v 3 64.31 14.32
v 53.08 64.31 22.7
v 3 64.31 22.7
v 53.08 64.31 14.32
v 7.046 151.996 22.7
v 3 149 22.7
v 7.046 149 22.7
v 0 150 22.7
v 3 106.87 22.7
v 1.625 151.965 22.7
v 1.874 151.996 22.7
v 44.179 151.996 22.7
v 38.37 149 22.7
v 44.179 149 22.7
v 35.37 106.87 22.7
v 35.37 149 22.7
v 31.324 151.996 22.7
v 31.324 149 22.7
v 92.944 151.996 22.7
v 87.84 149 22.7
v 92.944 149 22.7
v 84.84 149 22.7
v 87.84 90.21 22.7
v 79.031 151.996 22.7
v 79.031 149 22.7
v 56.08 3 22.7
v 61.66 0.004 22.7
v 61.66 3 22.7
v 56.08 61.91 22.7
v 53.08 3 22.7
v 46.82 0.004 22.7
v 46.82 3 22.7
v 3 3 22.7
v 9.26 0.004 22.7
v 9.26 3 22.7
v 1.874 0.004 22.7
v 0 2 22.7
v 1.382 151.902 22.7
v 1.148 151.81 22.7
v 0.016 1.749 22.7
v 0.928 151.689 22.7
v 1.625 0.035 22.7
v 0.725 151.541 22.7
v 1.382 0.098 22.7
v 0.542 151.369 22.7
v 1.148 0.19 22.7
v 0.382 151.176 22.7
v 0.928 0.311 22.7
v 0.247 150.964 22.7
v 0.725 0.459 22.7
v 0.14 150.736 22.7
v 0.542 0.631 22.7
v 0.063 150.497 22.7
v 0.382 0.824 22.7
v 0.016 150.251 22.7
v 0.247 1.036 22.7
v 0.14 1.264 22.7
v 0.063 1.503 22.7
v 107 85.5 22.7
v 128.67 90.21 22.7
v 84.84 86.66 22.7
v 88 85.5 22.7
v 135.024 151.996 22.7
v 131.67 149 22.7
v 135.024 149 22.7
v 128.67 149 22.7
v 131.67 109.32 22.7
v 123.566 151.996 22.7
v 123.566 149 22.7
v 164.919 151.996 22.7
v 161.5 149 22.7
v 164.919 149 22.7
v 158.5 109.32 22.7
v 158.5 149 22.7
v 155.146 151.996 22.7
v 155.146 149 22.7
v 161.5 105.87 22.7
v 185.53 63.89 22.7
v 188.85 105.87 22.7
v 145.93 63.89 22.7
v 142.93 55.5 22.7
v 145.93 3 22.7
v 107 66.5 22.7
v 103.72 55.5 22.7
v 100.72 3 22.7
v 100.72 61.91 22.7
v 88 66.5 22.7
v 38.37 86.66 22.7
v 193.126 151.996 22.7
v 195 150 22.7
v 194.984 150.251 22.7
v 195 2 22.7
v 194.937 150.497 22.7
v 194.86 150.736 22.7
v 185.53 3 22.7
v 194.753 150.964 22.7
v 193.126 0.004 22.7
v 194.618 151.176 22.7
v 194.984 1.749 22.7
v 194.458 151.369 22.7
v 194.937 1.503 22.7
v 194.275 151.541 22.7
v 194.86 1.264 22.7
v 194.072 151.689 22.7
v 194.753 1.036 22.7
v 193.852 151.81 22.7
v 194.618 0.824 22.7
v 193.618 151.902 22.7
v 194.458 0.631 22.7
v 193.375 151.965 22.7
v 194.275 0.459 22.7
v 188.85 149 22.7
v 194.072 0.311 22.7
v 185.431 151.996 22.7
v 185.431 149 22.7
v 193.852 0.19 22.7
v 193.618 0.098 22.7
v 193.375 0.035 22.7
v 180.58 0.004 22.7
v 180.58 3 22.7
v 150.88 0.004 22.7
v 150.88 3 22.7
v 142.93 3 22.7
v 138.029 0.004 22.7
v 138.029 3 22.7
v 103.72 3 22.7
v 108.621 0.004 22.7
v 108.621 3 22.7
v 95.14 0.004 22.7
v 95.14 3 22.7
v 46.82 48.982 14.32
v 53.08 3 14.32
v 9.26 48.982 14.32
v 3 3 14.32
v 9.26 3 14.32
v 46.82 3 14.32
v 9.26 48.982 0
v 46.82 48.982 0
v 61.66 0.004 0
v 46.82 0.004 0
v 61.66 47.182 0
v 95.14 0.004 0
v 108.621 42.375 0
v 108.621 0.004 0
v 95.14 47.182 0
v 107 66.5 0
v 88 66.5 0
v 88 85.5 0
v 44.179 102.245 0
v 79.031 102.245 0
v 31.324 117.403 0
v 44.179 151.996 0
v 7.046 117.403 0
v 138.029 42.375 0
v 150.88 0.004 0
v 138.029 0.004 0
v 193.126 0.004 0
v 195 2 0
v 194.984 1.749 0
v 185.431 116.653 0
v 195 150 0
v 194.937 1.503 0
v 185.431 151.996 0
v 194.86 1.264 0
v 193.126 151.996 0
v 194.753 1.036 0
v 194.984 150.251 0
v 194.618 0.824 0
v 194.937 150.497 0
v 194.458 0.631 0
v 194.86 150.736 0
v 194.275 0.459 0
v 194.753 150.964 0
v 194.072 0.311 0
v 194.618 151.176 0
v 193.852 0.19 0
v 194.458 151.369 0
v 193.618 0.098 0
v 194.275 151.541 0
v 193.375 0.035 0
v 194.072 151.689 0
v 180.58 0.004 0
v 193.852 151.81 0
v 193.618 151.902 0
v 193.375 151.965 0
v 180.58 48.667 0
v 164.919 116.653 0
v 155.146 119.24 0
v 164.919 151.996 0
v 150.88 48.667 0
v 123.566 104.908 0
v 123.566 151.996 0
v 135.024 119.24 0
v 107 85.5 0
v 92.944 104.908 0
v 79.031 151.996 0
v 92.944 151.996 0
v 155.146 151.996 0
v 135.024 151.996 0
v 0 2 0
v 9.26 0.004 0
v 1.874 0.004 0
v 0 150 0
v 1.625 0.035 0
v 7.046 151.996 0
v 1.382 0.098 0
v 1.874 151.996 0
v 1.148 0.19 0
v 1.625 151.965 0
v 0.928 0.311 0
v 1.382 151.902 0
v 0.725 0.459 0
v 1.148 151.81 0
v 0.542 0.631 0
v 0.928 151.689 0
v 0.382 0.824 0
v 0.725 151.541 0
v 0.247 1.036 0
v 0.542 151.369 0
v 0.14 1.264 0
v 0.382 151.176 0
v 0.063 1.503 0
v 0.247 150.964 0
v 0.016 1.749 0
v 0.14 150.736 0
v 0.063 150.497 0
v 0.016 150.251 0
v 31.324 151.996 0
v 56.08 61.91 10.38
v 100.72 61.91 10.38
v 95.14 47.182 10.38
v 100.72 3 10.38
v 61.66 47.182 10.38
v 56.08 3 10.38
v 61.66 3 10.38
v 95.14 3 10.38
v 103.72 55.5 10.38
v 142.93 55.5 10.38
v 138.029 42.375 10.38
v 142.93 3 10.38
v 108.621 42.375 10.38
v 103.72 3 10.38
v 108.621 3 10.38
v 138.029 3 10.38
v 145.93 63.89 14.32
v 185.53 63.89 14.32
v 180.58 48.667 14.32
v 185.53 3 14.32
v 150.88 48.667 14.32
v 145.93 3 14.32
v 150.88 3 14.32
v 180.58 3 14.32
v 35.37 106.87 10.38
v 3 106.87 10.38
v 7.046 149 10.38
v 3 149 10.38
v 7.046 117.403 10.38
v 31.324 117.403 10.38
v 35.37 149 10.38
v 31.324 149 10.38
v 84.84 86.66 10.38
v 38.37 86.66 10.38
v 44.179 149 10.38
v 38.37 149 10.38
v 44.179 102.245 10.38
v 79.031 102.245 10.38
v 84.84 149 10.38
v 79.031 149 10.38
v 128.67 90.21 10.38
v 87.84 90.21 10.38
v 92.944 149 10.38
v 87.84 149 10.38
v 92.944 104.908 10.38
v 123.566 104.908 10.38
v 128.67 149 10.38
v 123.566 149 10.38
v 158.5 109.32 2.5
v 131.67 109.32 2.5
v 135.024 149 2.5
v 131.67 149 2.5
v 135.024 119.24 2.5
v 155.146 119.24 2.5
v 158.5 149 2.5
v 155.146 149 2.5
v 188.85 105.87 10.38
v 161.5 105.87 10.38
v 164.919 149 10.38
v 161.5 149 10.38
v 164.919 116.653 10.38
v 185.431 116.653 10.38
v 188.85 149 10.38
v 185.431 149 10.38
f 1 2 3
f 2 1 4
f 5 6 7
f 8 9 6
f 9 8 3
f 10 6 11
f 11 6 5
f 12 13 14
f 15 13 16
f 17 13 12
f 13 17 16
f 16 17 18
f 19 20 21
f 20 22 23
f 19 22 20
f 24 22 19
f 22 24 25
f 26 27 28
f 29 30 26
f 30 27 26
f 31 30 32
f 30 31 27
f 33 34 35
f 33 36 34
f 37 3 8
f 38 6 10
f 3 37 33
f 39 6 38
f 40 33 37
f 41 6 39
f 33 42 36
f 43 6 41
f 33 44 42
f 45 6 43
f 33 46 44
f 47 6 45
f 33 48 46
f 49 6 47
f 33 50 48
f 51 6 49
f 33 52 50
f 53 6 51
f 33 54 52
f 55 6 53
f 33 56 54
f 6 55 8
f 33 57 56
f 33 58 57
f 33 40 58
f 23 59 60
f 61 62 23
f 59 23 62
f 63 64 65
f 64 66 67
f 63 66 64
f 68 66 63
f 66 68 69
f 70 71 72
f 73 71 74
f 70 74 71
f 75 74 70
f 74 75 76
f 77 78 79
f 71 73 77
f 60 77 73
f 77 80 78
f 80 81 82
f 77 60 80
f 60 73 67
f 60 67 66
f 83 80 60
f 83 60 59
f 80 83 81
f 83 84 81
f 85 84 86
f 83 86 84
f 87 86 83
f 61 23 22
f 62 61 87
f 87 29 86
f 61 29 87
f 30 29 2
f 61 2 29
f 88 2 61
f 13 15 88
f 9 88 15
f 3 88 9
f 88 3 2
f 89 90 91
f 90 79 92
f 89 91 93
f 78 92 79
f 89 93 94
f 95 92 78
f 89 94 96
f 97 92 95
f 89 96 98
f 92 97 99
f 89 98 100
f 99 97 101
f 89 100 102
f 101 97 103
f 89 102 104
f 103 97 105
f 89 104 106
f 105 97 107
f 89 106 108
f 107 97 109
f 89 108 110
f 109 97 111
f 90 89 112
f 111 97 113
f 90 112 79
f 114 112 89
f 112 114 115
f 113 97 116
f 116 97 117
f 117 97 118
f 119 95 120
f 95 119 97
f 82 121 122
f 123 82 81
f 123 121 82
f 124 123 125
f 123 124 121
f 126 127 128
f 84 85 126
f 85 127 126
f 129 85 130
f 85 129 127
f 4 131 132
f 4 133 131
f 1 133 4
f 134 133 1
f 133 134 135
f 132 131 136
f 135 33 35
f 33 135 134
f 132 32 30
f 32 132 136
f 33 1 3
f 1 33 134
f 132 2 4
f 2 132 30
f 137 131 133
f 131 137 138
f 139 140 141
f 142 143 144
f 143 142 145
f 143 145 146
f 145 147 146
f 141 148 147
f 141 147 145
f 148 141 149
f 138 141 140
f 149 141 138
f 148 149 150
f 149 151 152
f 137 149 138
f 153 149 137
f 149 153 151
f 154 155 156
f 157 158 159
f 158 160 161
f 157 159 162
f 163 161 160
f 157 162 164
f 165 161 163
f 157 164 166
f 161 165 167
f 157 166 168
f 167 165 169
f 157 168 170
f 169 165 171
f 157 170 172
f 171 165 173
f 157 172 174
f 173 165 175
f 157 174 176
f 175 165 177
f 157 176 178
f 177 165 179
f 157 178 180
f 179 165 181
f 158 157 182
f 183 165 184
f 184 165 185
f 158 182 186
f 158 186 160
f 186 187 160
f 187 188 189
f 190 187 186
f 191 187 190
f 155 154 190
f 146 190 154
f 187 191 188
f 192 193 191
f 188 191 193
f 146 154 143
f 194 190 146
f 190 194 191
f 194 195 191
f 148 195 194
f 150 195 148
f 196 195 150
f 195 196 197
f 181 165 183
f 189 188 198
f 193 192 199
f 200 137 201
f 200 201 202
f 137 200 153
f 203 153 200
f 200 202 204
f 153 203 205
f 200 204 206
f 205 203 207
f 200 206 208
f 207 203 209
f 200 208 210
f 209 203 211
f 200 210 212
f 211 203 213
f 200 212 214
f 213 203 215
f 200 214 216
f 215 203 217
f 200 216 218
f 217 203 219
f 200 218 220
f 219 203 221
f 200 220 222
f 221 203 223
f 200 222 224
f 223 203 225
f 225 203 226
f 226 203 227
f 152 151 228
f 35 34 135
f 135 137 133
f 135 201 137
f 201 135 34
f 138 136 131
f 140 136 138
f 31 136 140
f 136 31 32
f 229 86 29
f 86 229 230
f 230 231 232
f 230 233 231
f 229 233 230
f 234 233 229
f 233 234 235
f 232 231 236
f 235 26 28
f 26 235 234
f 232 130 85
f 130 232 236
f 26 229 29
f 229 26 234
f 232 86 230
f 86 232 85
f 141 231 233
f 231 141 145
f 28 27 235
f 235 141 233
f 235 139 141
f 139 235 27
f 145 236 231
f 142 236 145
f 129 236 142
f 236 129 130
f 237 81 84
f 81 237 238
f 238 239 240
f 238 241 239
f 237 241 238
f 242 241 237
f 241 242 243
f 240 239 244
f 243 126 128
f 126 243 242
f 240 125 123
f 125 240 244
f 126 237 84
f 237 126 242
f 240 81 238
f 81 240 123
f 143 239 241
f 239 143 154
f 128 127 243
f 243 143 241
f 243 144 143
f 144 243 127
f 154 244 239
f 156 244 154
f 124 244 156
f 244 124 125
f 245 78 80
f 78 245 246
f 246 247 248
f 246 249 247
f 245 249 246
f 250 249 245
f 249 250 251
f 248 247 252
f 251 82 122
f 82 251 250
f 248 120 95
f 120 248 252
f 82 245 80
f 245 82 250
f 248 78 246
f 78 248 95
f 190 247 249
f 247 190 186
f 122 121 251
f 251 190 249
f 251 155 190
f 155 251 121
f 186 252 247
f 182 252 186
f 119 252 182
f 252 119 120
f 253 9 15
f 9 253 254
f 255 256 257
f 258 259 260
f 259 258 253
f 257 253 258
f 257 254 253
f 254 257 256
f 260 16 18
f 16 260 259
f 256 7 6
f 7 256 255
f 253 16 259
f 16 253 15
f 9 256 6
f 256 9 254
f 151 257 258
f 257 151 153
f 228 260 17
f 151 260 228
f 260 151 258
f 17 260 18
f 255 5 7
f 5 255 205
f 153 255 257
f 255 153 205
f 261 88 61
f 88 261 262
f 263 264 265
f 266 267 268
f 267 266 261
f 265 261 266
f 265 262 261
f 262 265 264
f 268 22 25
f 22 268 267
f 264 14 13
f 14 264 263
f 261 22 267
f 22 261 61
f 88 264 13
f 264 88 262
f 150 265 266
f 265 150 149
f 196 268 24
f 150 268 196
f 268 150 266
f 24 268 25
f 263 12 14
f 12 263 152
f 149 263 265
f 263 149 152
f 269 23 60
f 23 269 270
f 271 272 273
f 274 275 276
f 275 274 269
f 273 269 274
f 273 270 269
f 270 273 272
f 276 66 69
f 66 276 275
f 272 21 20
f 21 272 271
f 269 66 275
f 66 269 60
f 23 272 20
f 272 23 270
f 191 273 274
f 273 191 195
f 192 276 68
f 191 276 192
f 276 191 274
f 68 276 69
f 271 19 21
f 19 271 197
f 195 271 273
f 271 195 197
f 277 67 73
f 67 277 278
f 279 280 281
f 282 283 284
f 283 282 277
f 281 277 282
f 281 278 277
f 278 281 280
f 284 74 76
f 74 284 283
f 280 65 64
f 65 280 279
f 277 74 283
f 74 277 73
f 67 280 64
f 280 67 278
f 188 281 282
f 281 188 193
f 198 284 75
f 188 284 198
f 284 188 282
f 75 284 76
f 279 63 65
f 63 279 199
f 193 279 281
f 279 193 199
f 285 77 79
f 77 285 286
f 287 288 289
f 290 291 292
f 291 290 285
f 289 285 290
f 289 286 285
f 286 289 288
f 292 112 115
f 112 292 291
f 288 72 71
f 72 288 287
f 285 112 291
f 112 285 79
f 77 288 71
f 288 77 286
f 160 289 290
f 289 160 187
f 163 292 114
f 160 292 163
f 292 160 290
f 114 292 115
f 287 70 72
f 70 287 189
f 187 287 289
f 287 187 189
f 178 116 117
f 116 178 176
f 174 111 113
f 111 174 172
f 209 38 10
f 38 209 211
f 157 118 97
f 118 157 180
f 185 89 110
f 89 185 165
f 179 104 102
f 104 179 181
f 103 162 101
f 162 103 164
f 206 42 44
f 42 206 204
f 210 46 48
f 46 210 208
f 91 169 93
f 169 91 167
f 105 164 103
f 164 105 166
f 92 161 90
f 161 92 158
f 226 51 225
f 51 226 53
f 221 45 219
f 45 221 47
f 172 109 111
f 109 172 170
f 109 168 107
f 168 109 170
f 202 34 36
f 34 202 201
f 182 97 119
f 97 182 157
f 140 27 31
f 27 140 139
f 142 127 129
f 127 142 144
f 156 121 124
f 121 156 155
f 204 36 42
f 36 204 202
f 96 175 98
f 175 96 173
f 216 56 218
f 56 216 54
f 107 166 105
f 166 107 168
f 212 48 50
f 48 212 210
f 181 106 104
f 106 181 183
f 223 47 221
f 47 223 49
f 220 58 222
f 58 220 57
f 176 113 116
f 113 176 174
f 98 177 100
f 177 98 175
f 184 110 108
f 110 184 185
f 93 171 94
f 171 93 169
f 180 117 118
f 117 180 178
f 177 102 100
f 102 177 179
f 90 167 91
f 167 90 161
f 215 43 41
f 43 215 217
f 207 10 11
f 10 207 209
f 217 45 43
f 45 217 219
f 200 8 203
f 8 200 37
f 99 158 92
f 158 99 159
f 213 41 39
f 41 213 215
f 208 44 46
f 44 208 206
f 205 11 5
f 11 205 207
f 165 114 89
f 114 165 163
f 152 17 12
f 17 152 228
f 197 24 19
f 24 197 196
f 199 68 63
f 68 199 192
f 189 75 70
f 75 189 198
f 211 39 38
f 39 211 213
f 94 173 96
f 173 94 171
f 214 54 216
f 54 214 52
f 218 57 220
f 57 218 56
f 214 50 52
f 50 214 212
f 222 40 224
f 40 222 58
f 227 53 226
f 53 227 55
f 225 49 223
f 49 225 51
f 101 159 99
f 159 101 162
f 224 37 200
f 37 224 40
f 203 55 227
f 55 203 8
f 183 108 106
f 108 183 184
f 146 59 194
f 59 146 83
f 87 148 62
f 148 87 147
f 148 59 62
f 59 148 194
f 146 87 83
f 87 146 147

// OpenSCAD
// file: SquarePileLib.scad
module LeftPile(wallThickness, totalHeight, singlePileHeight, singlePileWidth, singlePileLength, pileCount, openingSizePercent = .75){
    pileHeight = (pileCount * singlePileHeight) + .5;
    lengthOpeningSize = singlePileLength * openingSizePercent;
    widthOpeningSize = singlePileWidth * openingSizePercent;
    blockerSize = (singlePileWidth - widthOpeningSize) / 2;
    
    translate([wallThickness, wallThickness, totalHeight - pileHeight])
        cube([singlePileLength, singlePileWidth, pileHeight]);
    translate([-.00001, wallThickness + (blockerSize), 0])
        cube([wallThickness + lengthOpeningSize, widthOpeningSize, totalHeight]);
}

module RightPile(wallThickness, totalHeight, singlePileHeight, singlePileWidth, singlePileLength, pileCount, openingSizePercent = .75){
    translate([0, wallThickness + wallThickness + singlePileWidth, 0])
        rotate([0, 0, 180])
            LeftPile(wallThickness, totalHeight, singlePileHeight, singlePileWidth, singlePileLength, pileCount, openingSizePercent);
}

module BottomPile(wallThickness, totalHeight, singlePileHeight, singlePileWidth, singlePileLength, pileCount, openingSizePercent = .75){
    translate([wallThickness + wallThickness + singlePileWidth, 0, 0])
        rotate([0, 0, 90])
            LeftPile(wallThickness, totalHeight, singlePileHeight, singlePileWidth, singlePileLength, pileCount, openingSizePercent);
}

module TopPile(wallThickness, totalHeight, singlePileHeight, singlePileWidth, singlePileLength, pileCount, openingSizePercent = .75){
        rotate([0, 0, 270])
            LeftPile(wallThickness, totalHeight, singlePileHeight, singlePileWidth, singlePileLength, pileCount, openingSizePercent);
}
// main file
include<SquarePileLib.scad>

length = 195;

magnetHoleWidth = 19;
wallThickness = 3;
singlePileHeight = 1.97;
maxTokenHeight = 62;
maxTokenCount = 10;
width = wallThickness + maxTokenHeight + wallThickness + magnetHoleWidth + maxTokenHeight + wallThickness;
height = wallThickness + (maxTokenCount * singlePileHeight);
echo ("width = ", width);
echo ("length = ", length);
/*
Algox 1	49.08	60.31	4
Algox 2	31.37	41.13	6
Algox 3	38.21	51.5	6
Algox 4	38.6	59.89	4
Algox 5	43.64	57.91	6
Algox 6	45.47	61.34	6
Undead 1	39.83	57.79	6
Undead 2	25.83	38.68	10
Undead 3	26.35	42.13	6
*/
token1Width = 49.08 + 1;
token1Height = 60.31 + 1;
token1Count = 4;
token2Width = 43.64 + 1;
token2Height = 57.91 + 1;
token2Count = 6;
token3Width = 38.21 + 1;
token3Height = 51.5 + 1;
token3Count = 6;
token4Width = 38.6 + 1;
token4Height = 59.89 + 1;
token4Count = 4;
token5Width = 31.37 + 1;
token5Height = 41.13 + 1;
token5Count = 6;
token6Width = 45.47 + 1;
token6Height = 61.34 + 1;
token6Count = 6;
token7Width = 39.83 + 1;
token7Height = 57.79 + 1;
token7Count = 6;
token8Width = 25.83 + 1;
token8Height = 38.68 + 1;
token8Count = 10;
token9Width = 26.35 + 1;
token9Height = 42.13 + 1;
token9Count = 6;

difference() {

    $fn=50;
    minkowski()
    {
      translate([2,2,0])
        cube([length-4, width-4, height - 1]);
      cylinder(r=2,h=1);
    }
    translate([0, 0, 0])
        BottomPile(
            wallThickness,
            height,
            singlePileHeight,
            token1Width,
            token1Height,
            token1Count
        );
    translate([token1Width + wallThickness, 0, 0])
        BottomPile(
            wallThickness,
            height,
            singlePileHeight,
            token2Width,
            token2Height,
            token2Count
        );
    translate([token1Width + token2Width + wallThickness * 2, 0, 0])
        BottomPile(
            wallThickness,
            height,
            singlePileHeight,
            token3Width,
            token3Height,
            token3Count
        );
    translate([token1Width + token2Width + token3Width + wallThickness * 3, 0, 0])
        BottomPile(
            wallThickness,
            height,
            singlePileHeight,
            token4Width,
            token4Height,
            token4Count
        );
    
    translate([0, width, 0])
        TopPile(
            wallThickness,
            height,
            singlePileHeight,
            token5Width,
            token5Height,
            token5Count
        );
    translate([token5Width + wallThickness, width, 0])
        TopPile(
            wallThickness,
            height,
            singlePileHeight,
            token6Width,
            token6Height,
            token6Count
        );
    translate([token5Width + token6Width + wallThickness * 2, width, 0])
        TopPile(
            wallThickness,
            height,
            singlePileHeight,
            token7Width,
            token7Height,
            token7Count
        );
    translate([token5Width + token6Width + token7Width + wallThickness * 3, width, 0])
        TopPile(
            wallThickness,
            height,
            singlePileHeight,
            token8Width,
            token8Height,
            token8Count
        );
    translate([token5Width + token6Width + token7Width + token8Width + wallThickness * 4, width, 0])
        TopPile(
            wallThickness,
            height,
            singlePileHeight,
            token9Width,
            token9Height,
            token9Count
        );

    
    translate([length/2 - magnetHoleWidth/2, width/2 - magnetHoleWidth/2, 0])
        cube([magnetHoleWidth, magnetHoleWidth, height]);
}
